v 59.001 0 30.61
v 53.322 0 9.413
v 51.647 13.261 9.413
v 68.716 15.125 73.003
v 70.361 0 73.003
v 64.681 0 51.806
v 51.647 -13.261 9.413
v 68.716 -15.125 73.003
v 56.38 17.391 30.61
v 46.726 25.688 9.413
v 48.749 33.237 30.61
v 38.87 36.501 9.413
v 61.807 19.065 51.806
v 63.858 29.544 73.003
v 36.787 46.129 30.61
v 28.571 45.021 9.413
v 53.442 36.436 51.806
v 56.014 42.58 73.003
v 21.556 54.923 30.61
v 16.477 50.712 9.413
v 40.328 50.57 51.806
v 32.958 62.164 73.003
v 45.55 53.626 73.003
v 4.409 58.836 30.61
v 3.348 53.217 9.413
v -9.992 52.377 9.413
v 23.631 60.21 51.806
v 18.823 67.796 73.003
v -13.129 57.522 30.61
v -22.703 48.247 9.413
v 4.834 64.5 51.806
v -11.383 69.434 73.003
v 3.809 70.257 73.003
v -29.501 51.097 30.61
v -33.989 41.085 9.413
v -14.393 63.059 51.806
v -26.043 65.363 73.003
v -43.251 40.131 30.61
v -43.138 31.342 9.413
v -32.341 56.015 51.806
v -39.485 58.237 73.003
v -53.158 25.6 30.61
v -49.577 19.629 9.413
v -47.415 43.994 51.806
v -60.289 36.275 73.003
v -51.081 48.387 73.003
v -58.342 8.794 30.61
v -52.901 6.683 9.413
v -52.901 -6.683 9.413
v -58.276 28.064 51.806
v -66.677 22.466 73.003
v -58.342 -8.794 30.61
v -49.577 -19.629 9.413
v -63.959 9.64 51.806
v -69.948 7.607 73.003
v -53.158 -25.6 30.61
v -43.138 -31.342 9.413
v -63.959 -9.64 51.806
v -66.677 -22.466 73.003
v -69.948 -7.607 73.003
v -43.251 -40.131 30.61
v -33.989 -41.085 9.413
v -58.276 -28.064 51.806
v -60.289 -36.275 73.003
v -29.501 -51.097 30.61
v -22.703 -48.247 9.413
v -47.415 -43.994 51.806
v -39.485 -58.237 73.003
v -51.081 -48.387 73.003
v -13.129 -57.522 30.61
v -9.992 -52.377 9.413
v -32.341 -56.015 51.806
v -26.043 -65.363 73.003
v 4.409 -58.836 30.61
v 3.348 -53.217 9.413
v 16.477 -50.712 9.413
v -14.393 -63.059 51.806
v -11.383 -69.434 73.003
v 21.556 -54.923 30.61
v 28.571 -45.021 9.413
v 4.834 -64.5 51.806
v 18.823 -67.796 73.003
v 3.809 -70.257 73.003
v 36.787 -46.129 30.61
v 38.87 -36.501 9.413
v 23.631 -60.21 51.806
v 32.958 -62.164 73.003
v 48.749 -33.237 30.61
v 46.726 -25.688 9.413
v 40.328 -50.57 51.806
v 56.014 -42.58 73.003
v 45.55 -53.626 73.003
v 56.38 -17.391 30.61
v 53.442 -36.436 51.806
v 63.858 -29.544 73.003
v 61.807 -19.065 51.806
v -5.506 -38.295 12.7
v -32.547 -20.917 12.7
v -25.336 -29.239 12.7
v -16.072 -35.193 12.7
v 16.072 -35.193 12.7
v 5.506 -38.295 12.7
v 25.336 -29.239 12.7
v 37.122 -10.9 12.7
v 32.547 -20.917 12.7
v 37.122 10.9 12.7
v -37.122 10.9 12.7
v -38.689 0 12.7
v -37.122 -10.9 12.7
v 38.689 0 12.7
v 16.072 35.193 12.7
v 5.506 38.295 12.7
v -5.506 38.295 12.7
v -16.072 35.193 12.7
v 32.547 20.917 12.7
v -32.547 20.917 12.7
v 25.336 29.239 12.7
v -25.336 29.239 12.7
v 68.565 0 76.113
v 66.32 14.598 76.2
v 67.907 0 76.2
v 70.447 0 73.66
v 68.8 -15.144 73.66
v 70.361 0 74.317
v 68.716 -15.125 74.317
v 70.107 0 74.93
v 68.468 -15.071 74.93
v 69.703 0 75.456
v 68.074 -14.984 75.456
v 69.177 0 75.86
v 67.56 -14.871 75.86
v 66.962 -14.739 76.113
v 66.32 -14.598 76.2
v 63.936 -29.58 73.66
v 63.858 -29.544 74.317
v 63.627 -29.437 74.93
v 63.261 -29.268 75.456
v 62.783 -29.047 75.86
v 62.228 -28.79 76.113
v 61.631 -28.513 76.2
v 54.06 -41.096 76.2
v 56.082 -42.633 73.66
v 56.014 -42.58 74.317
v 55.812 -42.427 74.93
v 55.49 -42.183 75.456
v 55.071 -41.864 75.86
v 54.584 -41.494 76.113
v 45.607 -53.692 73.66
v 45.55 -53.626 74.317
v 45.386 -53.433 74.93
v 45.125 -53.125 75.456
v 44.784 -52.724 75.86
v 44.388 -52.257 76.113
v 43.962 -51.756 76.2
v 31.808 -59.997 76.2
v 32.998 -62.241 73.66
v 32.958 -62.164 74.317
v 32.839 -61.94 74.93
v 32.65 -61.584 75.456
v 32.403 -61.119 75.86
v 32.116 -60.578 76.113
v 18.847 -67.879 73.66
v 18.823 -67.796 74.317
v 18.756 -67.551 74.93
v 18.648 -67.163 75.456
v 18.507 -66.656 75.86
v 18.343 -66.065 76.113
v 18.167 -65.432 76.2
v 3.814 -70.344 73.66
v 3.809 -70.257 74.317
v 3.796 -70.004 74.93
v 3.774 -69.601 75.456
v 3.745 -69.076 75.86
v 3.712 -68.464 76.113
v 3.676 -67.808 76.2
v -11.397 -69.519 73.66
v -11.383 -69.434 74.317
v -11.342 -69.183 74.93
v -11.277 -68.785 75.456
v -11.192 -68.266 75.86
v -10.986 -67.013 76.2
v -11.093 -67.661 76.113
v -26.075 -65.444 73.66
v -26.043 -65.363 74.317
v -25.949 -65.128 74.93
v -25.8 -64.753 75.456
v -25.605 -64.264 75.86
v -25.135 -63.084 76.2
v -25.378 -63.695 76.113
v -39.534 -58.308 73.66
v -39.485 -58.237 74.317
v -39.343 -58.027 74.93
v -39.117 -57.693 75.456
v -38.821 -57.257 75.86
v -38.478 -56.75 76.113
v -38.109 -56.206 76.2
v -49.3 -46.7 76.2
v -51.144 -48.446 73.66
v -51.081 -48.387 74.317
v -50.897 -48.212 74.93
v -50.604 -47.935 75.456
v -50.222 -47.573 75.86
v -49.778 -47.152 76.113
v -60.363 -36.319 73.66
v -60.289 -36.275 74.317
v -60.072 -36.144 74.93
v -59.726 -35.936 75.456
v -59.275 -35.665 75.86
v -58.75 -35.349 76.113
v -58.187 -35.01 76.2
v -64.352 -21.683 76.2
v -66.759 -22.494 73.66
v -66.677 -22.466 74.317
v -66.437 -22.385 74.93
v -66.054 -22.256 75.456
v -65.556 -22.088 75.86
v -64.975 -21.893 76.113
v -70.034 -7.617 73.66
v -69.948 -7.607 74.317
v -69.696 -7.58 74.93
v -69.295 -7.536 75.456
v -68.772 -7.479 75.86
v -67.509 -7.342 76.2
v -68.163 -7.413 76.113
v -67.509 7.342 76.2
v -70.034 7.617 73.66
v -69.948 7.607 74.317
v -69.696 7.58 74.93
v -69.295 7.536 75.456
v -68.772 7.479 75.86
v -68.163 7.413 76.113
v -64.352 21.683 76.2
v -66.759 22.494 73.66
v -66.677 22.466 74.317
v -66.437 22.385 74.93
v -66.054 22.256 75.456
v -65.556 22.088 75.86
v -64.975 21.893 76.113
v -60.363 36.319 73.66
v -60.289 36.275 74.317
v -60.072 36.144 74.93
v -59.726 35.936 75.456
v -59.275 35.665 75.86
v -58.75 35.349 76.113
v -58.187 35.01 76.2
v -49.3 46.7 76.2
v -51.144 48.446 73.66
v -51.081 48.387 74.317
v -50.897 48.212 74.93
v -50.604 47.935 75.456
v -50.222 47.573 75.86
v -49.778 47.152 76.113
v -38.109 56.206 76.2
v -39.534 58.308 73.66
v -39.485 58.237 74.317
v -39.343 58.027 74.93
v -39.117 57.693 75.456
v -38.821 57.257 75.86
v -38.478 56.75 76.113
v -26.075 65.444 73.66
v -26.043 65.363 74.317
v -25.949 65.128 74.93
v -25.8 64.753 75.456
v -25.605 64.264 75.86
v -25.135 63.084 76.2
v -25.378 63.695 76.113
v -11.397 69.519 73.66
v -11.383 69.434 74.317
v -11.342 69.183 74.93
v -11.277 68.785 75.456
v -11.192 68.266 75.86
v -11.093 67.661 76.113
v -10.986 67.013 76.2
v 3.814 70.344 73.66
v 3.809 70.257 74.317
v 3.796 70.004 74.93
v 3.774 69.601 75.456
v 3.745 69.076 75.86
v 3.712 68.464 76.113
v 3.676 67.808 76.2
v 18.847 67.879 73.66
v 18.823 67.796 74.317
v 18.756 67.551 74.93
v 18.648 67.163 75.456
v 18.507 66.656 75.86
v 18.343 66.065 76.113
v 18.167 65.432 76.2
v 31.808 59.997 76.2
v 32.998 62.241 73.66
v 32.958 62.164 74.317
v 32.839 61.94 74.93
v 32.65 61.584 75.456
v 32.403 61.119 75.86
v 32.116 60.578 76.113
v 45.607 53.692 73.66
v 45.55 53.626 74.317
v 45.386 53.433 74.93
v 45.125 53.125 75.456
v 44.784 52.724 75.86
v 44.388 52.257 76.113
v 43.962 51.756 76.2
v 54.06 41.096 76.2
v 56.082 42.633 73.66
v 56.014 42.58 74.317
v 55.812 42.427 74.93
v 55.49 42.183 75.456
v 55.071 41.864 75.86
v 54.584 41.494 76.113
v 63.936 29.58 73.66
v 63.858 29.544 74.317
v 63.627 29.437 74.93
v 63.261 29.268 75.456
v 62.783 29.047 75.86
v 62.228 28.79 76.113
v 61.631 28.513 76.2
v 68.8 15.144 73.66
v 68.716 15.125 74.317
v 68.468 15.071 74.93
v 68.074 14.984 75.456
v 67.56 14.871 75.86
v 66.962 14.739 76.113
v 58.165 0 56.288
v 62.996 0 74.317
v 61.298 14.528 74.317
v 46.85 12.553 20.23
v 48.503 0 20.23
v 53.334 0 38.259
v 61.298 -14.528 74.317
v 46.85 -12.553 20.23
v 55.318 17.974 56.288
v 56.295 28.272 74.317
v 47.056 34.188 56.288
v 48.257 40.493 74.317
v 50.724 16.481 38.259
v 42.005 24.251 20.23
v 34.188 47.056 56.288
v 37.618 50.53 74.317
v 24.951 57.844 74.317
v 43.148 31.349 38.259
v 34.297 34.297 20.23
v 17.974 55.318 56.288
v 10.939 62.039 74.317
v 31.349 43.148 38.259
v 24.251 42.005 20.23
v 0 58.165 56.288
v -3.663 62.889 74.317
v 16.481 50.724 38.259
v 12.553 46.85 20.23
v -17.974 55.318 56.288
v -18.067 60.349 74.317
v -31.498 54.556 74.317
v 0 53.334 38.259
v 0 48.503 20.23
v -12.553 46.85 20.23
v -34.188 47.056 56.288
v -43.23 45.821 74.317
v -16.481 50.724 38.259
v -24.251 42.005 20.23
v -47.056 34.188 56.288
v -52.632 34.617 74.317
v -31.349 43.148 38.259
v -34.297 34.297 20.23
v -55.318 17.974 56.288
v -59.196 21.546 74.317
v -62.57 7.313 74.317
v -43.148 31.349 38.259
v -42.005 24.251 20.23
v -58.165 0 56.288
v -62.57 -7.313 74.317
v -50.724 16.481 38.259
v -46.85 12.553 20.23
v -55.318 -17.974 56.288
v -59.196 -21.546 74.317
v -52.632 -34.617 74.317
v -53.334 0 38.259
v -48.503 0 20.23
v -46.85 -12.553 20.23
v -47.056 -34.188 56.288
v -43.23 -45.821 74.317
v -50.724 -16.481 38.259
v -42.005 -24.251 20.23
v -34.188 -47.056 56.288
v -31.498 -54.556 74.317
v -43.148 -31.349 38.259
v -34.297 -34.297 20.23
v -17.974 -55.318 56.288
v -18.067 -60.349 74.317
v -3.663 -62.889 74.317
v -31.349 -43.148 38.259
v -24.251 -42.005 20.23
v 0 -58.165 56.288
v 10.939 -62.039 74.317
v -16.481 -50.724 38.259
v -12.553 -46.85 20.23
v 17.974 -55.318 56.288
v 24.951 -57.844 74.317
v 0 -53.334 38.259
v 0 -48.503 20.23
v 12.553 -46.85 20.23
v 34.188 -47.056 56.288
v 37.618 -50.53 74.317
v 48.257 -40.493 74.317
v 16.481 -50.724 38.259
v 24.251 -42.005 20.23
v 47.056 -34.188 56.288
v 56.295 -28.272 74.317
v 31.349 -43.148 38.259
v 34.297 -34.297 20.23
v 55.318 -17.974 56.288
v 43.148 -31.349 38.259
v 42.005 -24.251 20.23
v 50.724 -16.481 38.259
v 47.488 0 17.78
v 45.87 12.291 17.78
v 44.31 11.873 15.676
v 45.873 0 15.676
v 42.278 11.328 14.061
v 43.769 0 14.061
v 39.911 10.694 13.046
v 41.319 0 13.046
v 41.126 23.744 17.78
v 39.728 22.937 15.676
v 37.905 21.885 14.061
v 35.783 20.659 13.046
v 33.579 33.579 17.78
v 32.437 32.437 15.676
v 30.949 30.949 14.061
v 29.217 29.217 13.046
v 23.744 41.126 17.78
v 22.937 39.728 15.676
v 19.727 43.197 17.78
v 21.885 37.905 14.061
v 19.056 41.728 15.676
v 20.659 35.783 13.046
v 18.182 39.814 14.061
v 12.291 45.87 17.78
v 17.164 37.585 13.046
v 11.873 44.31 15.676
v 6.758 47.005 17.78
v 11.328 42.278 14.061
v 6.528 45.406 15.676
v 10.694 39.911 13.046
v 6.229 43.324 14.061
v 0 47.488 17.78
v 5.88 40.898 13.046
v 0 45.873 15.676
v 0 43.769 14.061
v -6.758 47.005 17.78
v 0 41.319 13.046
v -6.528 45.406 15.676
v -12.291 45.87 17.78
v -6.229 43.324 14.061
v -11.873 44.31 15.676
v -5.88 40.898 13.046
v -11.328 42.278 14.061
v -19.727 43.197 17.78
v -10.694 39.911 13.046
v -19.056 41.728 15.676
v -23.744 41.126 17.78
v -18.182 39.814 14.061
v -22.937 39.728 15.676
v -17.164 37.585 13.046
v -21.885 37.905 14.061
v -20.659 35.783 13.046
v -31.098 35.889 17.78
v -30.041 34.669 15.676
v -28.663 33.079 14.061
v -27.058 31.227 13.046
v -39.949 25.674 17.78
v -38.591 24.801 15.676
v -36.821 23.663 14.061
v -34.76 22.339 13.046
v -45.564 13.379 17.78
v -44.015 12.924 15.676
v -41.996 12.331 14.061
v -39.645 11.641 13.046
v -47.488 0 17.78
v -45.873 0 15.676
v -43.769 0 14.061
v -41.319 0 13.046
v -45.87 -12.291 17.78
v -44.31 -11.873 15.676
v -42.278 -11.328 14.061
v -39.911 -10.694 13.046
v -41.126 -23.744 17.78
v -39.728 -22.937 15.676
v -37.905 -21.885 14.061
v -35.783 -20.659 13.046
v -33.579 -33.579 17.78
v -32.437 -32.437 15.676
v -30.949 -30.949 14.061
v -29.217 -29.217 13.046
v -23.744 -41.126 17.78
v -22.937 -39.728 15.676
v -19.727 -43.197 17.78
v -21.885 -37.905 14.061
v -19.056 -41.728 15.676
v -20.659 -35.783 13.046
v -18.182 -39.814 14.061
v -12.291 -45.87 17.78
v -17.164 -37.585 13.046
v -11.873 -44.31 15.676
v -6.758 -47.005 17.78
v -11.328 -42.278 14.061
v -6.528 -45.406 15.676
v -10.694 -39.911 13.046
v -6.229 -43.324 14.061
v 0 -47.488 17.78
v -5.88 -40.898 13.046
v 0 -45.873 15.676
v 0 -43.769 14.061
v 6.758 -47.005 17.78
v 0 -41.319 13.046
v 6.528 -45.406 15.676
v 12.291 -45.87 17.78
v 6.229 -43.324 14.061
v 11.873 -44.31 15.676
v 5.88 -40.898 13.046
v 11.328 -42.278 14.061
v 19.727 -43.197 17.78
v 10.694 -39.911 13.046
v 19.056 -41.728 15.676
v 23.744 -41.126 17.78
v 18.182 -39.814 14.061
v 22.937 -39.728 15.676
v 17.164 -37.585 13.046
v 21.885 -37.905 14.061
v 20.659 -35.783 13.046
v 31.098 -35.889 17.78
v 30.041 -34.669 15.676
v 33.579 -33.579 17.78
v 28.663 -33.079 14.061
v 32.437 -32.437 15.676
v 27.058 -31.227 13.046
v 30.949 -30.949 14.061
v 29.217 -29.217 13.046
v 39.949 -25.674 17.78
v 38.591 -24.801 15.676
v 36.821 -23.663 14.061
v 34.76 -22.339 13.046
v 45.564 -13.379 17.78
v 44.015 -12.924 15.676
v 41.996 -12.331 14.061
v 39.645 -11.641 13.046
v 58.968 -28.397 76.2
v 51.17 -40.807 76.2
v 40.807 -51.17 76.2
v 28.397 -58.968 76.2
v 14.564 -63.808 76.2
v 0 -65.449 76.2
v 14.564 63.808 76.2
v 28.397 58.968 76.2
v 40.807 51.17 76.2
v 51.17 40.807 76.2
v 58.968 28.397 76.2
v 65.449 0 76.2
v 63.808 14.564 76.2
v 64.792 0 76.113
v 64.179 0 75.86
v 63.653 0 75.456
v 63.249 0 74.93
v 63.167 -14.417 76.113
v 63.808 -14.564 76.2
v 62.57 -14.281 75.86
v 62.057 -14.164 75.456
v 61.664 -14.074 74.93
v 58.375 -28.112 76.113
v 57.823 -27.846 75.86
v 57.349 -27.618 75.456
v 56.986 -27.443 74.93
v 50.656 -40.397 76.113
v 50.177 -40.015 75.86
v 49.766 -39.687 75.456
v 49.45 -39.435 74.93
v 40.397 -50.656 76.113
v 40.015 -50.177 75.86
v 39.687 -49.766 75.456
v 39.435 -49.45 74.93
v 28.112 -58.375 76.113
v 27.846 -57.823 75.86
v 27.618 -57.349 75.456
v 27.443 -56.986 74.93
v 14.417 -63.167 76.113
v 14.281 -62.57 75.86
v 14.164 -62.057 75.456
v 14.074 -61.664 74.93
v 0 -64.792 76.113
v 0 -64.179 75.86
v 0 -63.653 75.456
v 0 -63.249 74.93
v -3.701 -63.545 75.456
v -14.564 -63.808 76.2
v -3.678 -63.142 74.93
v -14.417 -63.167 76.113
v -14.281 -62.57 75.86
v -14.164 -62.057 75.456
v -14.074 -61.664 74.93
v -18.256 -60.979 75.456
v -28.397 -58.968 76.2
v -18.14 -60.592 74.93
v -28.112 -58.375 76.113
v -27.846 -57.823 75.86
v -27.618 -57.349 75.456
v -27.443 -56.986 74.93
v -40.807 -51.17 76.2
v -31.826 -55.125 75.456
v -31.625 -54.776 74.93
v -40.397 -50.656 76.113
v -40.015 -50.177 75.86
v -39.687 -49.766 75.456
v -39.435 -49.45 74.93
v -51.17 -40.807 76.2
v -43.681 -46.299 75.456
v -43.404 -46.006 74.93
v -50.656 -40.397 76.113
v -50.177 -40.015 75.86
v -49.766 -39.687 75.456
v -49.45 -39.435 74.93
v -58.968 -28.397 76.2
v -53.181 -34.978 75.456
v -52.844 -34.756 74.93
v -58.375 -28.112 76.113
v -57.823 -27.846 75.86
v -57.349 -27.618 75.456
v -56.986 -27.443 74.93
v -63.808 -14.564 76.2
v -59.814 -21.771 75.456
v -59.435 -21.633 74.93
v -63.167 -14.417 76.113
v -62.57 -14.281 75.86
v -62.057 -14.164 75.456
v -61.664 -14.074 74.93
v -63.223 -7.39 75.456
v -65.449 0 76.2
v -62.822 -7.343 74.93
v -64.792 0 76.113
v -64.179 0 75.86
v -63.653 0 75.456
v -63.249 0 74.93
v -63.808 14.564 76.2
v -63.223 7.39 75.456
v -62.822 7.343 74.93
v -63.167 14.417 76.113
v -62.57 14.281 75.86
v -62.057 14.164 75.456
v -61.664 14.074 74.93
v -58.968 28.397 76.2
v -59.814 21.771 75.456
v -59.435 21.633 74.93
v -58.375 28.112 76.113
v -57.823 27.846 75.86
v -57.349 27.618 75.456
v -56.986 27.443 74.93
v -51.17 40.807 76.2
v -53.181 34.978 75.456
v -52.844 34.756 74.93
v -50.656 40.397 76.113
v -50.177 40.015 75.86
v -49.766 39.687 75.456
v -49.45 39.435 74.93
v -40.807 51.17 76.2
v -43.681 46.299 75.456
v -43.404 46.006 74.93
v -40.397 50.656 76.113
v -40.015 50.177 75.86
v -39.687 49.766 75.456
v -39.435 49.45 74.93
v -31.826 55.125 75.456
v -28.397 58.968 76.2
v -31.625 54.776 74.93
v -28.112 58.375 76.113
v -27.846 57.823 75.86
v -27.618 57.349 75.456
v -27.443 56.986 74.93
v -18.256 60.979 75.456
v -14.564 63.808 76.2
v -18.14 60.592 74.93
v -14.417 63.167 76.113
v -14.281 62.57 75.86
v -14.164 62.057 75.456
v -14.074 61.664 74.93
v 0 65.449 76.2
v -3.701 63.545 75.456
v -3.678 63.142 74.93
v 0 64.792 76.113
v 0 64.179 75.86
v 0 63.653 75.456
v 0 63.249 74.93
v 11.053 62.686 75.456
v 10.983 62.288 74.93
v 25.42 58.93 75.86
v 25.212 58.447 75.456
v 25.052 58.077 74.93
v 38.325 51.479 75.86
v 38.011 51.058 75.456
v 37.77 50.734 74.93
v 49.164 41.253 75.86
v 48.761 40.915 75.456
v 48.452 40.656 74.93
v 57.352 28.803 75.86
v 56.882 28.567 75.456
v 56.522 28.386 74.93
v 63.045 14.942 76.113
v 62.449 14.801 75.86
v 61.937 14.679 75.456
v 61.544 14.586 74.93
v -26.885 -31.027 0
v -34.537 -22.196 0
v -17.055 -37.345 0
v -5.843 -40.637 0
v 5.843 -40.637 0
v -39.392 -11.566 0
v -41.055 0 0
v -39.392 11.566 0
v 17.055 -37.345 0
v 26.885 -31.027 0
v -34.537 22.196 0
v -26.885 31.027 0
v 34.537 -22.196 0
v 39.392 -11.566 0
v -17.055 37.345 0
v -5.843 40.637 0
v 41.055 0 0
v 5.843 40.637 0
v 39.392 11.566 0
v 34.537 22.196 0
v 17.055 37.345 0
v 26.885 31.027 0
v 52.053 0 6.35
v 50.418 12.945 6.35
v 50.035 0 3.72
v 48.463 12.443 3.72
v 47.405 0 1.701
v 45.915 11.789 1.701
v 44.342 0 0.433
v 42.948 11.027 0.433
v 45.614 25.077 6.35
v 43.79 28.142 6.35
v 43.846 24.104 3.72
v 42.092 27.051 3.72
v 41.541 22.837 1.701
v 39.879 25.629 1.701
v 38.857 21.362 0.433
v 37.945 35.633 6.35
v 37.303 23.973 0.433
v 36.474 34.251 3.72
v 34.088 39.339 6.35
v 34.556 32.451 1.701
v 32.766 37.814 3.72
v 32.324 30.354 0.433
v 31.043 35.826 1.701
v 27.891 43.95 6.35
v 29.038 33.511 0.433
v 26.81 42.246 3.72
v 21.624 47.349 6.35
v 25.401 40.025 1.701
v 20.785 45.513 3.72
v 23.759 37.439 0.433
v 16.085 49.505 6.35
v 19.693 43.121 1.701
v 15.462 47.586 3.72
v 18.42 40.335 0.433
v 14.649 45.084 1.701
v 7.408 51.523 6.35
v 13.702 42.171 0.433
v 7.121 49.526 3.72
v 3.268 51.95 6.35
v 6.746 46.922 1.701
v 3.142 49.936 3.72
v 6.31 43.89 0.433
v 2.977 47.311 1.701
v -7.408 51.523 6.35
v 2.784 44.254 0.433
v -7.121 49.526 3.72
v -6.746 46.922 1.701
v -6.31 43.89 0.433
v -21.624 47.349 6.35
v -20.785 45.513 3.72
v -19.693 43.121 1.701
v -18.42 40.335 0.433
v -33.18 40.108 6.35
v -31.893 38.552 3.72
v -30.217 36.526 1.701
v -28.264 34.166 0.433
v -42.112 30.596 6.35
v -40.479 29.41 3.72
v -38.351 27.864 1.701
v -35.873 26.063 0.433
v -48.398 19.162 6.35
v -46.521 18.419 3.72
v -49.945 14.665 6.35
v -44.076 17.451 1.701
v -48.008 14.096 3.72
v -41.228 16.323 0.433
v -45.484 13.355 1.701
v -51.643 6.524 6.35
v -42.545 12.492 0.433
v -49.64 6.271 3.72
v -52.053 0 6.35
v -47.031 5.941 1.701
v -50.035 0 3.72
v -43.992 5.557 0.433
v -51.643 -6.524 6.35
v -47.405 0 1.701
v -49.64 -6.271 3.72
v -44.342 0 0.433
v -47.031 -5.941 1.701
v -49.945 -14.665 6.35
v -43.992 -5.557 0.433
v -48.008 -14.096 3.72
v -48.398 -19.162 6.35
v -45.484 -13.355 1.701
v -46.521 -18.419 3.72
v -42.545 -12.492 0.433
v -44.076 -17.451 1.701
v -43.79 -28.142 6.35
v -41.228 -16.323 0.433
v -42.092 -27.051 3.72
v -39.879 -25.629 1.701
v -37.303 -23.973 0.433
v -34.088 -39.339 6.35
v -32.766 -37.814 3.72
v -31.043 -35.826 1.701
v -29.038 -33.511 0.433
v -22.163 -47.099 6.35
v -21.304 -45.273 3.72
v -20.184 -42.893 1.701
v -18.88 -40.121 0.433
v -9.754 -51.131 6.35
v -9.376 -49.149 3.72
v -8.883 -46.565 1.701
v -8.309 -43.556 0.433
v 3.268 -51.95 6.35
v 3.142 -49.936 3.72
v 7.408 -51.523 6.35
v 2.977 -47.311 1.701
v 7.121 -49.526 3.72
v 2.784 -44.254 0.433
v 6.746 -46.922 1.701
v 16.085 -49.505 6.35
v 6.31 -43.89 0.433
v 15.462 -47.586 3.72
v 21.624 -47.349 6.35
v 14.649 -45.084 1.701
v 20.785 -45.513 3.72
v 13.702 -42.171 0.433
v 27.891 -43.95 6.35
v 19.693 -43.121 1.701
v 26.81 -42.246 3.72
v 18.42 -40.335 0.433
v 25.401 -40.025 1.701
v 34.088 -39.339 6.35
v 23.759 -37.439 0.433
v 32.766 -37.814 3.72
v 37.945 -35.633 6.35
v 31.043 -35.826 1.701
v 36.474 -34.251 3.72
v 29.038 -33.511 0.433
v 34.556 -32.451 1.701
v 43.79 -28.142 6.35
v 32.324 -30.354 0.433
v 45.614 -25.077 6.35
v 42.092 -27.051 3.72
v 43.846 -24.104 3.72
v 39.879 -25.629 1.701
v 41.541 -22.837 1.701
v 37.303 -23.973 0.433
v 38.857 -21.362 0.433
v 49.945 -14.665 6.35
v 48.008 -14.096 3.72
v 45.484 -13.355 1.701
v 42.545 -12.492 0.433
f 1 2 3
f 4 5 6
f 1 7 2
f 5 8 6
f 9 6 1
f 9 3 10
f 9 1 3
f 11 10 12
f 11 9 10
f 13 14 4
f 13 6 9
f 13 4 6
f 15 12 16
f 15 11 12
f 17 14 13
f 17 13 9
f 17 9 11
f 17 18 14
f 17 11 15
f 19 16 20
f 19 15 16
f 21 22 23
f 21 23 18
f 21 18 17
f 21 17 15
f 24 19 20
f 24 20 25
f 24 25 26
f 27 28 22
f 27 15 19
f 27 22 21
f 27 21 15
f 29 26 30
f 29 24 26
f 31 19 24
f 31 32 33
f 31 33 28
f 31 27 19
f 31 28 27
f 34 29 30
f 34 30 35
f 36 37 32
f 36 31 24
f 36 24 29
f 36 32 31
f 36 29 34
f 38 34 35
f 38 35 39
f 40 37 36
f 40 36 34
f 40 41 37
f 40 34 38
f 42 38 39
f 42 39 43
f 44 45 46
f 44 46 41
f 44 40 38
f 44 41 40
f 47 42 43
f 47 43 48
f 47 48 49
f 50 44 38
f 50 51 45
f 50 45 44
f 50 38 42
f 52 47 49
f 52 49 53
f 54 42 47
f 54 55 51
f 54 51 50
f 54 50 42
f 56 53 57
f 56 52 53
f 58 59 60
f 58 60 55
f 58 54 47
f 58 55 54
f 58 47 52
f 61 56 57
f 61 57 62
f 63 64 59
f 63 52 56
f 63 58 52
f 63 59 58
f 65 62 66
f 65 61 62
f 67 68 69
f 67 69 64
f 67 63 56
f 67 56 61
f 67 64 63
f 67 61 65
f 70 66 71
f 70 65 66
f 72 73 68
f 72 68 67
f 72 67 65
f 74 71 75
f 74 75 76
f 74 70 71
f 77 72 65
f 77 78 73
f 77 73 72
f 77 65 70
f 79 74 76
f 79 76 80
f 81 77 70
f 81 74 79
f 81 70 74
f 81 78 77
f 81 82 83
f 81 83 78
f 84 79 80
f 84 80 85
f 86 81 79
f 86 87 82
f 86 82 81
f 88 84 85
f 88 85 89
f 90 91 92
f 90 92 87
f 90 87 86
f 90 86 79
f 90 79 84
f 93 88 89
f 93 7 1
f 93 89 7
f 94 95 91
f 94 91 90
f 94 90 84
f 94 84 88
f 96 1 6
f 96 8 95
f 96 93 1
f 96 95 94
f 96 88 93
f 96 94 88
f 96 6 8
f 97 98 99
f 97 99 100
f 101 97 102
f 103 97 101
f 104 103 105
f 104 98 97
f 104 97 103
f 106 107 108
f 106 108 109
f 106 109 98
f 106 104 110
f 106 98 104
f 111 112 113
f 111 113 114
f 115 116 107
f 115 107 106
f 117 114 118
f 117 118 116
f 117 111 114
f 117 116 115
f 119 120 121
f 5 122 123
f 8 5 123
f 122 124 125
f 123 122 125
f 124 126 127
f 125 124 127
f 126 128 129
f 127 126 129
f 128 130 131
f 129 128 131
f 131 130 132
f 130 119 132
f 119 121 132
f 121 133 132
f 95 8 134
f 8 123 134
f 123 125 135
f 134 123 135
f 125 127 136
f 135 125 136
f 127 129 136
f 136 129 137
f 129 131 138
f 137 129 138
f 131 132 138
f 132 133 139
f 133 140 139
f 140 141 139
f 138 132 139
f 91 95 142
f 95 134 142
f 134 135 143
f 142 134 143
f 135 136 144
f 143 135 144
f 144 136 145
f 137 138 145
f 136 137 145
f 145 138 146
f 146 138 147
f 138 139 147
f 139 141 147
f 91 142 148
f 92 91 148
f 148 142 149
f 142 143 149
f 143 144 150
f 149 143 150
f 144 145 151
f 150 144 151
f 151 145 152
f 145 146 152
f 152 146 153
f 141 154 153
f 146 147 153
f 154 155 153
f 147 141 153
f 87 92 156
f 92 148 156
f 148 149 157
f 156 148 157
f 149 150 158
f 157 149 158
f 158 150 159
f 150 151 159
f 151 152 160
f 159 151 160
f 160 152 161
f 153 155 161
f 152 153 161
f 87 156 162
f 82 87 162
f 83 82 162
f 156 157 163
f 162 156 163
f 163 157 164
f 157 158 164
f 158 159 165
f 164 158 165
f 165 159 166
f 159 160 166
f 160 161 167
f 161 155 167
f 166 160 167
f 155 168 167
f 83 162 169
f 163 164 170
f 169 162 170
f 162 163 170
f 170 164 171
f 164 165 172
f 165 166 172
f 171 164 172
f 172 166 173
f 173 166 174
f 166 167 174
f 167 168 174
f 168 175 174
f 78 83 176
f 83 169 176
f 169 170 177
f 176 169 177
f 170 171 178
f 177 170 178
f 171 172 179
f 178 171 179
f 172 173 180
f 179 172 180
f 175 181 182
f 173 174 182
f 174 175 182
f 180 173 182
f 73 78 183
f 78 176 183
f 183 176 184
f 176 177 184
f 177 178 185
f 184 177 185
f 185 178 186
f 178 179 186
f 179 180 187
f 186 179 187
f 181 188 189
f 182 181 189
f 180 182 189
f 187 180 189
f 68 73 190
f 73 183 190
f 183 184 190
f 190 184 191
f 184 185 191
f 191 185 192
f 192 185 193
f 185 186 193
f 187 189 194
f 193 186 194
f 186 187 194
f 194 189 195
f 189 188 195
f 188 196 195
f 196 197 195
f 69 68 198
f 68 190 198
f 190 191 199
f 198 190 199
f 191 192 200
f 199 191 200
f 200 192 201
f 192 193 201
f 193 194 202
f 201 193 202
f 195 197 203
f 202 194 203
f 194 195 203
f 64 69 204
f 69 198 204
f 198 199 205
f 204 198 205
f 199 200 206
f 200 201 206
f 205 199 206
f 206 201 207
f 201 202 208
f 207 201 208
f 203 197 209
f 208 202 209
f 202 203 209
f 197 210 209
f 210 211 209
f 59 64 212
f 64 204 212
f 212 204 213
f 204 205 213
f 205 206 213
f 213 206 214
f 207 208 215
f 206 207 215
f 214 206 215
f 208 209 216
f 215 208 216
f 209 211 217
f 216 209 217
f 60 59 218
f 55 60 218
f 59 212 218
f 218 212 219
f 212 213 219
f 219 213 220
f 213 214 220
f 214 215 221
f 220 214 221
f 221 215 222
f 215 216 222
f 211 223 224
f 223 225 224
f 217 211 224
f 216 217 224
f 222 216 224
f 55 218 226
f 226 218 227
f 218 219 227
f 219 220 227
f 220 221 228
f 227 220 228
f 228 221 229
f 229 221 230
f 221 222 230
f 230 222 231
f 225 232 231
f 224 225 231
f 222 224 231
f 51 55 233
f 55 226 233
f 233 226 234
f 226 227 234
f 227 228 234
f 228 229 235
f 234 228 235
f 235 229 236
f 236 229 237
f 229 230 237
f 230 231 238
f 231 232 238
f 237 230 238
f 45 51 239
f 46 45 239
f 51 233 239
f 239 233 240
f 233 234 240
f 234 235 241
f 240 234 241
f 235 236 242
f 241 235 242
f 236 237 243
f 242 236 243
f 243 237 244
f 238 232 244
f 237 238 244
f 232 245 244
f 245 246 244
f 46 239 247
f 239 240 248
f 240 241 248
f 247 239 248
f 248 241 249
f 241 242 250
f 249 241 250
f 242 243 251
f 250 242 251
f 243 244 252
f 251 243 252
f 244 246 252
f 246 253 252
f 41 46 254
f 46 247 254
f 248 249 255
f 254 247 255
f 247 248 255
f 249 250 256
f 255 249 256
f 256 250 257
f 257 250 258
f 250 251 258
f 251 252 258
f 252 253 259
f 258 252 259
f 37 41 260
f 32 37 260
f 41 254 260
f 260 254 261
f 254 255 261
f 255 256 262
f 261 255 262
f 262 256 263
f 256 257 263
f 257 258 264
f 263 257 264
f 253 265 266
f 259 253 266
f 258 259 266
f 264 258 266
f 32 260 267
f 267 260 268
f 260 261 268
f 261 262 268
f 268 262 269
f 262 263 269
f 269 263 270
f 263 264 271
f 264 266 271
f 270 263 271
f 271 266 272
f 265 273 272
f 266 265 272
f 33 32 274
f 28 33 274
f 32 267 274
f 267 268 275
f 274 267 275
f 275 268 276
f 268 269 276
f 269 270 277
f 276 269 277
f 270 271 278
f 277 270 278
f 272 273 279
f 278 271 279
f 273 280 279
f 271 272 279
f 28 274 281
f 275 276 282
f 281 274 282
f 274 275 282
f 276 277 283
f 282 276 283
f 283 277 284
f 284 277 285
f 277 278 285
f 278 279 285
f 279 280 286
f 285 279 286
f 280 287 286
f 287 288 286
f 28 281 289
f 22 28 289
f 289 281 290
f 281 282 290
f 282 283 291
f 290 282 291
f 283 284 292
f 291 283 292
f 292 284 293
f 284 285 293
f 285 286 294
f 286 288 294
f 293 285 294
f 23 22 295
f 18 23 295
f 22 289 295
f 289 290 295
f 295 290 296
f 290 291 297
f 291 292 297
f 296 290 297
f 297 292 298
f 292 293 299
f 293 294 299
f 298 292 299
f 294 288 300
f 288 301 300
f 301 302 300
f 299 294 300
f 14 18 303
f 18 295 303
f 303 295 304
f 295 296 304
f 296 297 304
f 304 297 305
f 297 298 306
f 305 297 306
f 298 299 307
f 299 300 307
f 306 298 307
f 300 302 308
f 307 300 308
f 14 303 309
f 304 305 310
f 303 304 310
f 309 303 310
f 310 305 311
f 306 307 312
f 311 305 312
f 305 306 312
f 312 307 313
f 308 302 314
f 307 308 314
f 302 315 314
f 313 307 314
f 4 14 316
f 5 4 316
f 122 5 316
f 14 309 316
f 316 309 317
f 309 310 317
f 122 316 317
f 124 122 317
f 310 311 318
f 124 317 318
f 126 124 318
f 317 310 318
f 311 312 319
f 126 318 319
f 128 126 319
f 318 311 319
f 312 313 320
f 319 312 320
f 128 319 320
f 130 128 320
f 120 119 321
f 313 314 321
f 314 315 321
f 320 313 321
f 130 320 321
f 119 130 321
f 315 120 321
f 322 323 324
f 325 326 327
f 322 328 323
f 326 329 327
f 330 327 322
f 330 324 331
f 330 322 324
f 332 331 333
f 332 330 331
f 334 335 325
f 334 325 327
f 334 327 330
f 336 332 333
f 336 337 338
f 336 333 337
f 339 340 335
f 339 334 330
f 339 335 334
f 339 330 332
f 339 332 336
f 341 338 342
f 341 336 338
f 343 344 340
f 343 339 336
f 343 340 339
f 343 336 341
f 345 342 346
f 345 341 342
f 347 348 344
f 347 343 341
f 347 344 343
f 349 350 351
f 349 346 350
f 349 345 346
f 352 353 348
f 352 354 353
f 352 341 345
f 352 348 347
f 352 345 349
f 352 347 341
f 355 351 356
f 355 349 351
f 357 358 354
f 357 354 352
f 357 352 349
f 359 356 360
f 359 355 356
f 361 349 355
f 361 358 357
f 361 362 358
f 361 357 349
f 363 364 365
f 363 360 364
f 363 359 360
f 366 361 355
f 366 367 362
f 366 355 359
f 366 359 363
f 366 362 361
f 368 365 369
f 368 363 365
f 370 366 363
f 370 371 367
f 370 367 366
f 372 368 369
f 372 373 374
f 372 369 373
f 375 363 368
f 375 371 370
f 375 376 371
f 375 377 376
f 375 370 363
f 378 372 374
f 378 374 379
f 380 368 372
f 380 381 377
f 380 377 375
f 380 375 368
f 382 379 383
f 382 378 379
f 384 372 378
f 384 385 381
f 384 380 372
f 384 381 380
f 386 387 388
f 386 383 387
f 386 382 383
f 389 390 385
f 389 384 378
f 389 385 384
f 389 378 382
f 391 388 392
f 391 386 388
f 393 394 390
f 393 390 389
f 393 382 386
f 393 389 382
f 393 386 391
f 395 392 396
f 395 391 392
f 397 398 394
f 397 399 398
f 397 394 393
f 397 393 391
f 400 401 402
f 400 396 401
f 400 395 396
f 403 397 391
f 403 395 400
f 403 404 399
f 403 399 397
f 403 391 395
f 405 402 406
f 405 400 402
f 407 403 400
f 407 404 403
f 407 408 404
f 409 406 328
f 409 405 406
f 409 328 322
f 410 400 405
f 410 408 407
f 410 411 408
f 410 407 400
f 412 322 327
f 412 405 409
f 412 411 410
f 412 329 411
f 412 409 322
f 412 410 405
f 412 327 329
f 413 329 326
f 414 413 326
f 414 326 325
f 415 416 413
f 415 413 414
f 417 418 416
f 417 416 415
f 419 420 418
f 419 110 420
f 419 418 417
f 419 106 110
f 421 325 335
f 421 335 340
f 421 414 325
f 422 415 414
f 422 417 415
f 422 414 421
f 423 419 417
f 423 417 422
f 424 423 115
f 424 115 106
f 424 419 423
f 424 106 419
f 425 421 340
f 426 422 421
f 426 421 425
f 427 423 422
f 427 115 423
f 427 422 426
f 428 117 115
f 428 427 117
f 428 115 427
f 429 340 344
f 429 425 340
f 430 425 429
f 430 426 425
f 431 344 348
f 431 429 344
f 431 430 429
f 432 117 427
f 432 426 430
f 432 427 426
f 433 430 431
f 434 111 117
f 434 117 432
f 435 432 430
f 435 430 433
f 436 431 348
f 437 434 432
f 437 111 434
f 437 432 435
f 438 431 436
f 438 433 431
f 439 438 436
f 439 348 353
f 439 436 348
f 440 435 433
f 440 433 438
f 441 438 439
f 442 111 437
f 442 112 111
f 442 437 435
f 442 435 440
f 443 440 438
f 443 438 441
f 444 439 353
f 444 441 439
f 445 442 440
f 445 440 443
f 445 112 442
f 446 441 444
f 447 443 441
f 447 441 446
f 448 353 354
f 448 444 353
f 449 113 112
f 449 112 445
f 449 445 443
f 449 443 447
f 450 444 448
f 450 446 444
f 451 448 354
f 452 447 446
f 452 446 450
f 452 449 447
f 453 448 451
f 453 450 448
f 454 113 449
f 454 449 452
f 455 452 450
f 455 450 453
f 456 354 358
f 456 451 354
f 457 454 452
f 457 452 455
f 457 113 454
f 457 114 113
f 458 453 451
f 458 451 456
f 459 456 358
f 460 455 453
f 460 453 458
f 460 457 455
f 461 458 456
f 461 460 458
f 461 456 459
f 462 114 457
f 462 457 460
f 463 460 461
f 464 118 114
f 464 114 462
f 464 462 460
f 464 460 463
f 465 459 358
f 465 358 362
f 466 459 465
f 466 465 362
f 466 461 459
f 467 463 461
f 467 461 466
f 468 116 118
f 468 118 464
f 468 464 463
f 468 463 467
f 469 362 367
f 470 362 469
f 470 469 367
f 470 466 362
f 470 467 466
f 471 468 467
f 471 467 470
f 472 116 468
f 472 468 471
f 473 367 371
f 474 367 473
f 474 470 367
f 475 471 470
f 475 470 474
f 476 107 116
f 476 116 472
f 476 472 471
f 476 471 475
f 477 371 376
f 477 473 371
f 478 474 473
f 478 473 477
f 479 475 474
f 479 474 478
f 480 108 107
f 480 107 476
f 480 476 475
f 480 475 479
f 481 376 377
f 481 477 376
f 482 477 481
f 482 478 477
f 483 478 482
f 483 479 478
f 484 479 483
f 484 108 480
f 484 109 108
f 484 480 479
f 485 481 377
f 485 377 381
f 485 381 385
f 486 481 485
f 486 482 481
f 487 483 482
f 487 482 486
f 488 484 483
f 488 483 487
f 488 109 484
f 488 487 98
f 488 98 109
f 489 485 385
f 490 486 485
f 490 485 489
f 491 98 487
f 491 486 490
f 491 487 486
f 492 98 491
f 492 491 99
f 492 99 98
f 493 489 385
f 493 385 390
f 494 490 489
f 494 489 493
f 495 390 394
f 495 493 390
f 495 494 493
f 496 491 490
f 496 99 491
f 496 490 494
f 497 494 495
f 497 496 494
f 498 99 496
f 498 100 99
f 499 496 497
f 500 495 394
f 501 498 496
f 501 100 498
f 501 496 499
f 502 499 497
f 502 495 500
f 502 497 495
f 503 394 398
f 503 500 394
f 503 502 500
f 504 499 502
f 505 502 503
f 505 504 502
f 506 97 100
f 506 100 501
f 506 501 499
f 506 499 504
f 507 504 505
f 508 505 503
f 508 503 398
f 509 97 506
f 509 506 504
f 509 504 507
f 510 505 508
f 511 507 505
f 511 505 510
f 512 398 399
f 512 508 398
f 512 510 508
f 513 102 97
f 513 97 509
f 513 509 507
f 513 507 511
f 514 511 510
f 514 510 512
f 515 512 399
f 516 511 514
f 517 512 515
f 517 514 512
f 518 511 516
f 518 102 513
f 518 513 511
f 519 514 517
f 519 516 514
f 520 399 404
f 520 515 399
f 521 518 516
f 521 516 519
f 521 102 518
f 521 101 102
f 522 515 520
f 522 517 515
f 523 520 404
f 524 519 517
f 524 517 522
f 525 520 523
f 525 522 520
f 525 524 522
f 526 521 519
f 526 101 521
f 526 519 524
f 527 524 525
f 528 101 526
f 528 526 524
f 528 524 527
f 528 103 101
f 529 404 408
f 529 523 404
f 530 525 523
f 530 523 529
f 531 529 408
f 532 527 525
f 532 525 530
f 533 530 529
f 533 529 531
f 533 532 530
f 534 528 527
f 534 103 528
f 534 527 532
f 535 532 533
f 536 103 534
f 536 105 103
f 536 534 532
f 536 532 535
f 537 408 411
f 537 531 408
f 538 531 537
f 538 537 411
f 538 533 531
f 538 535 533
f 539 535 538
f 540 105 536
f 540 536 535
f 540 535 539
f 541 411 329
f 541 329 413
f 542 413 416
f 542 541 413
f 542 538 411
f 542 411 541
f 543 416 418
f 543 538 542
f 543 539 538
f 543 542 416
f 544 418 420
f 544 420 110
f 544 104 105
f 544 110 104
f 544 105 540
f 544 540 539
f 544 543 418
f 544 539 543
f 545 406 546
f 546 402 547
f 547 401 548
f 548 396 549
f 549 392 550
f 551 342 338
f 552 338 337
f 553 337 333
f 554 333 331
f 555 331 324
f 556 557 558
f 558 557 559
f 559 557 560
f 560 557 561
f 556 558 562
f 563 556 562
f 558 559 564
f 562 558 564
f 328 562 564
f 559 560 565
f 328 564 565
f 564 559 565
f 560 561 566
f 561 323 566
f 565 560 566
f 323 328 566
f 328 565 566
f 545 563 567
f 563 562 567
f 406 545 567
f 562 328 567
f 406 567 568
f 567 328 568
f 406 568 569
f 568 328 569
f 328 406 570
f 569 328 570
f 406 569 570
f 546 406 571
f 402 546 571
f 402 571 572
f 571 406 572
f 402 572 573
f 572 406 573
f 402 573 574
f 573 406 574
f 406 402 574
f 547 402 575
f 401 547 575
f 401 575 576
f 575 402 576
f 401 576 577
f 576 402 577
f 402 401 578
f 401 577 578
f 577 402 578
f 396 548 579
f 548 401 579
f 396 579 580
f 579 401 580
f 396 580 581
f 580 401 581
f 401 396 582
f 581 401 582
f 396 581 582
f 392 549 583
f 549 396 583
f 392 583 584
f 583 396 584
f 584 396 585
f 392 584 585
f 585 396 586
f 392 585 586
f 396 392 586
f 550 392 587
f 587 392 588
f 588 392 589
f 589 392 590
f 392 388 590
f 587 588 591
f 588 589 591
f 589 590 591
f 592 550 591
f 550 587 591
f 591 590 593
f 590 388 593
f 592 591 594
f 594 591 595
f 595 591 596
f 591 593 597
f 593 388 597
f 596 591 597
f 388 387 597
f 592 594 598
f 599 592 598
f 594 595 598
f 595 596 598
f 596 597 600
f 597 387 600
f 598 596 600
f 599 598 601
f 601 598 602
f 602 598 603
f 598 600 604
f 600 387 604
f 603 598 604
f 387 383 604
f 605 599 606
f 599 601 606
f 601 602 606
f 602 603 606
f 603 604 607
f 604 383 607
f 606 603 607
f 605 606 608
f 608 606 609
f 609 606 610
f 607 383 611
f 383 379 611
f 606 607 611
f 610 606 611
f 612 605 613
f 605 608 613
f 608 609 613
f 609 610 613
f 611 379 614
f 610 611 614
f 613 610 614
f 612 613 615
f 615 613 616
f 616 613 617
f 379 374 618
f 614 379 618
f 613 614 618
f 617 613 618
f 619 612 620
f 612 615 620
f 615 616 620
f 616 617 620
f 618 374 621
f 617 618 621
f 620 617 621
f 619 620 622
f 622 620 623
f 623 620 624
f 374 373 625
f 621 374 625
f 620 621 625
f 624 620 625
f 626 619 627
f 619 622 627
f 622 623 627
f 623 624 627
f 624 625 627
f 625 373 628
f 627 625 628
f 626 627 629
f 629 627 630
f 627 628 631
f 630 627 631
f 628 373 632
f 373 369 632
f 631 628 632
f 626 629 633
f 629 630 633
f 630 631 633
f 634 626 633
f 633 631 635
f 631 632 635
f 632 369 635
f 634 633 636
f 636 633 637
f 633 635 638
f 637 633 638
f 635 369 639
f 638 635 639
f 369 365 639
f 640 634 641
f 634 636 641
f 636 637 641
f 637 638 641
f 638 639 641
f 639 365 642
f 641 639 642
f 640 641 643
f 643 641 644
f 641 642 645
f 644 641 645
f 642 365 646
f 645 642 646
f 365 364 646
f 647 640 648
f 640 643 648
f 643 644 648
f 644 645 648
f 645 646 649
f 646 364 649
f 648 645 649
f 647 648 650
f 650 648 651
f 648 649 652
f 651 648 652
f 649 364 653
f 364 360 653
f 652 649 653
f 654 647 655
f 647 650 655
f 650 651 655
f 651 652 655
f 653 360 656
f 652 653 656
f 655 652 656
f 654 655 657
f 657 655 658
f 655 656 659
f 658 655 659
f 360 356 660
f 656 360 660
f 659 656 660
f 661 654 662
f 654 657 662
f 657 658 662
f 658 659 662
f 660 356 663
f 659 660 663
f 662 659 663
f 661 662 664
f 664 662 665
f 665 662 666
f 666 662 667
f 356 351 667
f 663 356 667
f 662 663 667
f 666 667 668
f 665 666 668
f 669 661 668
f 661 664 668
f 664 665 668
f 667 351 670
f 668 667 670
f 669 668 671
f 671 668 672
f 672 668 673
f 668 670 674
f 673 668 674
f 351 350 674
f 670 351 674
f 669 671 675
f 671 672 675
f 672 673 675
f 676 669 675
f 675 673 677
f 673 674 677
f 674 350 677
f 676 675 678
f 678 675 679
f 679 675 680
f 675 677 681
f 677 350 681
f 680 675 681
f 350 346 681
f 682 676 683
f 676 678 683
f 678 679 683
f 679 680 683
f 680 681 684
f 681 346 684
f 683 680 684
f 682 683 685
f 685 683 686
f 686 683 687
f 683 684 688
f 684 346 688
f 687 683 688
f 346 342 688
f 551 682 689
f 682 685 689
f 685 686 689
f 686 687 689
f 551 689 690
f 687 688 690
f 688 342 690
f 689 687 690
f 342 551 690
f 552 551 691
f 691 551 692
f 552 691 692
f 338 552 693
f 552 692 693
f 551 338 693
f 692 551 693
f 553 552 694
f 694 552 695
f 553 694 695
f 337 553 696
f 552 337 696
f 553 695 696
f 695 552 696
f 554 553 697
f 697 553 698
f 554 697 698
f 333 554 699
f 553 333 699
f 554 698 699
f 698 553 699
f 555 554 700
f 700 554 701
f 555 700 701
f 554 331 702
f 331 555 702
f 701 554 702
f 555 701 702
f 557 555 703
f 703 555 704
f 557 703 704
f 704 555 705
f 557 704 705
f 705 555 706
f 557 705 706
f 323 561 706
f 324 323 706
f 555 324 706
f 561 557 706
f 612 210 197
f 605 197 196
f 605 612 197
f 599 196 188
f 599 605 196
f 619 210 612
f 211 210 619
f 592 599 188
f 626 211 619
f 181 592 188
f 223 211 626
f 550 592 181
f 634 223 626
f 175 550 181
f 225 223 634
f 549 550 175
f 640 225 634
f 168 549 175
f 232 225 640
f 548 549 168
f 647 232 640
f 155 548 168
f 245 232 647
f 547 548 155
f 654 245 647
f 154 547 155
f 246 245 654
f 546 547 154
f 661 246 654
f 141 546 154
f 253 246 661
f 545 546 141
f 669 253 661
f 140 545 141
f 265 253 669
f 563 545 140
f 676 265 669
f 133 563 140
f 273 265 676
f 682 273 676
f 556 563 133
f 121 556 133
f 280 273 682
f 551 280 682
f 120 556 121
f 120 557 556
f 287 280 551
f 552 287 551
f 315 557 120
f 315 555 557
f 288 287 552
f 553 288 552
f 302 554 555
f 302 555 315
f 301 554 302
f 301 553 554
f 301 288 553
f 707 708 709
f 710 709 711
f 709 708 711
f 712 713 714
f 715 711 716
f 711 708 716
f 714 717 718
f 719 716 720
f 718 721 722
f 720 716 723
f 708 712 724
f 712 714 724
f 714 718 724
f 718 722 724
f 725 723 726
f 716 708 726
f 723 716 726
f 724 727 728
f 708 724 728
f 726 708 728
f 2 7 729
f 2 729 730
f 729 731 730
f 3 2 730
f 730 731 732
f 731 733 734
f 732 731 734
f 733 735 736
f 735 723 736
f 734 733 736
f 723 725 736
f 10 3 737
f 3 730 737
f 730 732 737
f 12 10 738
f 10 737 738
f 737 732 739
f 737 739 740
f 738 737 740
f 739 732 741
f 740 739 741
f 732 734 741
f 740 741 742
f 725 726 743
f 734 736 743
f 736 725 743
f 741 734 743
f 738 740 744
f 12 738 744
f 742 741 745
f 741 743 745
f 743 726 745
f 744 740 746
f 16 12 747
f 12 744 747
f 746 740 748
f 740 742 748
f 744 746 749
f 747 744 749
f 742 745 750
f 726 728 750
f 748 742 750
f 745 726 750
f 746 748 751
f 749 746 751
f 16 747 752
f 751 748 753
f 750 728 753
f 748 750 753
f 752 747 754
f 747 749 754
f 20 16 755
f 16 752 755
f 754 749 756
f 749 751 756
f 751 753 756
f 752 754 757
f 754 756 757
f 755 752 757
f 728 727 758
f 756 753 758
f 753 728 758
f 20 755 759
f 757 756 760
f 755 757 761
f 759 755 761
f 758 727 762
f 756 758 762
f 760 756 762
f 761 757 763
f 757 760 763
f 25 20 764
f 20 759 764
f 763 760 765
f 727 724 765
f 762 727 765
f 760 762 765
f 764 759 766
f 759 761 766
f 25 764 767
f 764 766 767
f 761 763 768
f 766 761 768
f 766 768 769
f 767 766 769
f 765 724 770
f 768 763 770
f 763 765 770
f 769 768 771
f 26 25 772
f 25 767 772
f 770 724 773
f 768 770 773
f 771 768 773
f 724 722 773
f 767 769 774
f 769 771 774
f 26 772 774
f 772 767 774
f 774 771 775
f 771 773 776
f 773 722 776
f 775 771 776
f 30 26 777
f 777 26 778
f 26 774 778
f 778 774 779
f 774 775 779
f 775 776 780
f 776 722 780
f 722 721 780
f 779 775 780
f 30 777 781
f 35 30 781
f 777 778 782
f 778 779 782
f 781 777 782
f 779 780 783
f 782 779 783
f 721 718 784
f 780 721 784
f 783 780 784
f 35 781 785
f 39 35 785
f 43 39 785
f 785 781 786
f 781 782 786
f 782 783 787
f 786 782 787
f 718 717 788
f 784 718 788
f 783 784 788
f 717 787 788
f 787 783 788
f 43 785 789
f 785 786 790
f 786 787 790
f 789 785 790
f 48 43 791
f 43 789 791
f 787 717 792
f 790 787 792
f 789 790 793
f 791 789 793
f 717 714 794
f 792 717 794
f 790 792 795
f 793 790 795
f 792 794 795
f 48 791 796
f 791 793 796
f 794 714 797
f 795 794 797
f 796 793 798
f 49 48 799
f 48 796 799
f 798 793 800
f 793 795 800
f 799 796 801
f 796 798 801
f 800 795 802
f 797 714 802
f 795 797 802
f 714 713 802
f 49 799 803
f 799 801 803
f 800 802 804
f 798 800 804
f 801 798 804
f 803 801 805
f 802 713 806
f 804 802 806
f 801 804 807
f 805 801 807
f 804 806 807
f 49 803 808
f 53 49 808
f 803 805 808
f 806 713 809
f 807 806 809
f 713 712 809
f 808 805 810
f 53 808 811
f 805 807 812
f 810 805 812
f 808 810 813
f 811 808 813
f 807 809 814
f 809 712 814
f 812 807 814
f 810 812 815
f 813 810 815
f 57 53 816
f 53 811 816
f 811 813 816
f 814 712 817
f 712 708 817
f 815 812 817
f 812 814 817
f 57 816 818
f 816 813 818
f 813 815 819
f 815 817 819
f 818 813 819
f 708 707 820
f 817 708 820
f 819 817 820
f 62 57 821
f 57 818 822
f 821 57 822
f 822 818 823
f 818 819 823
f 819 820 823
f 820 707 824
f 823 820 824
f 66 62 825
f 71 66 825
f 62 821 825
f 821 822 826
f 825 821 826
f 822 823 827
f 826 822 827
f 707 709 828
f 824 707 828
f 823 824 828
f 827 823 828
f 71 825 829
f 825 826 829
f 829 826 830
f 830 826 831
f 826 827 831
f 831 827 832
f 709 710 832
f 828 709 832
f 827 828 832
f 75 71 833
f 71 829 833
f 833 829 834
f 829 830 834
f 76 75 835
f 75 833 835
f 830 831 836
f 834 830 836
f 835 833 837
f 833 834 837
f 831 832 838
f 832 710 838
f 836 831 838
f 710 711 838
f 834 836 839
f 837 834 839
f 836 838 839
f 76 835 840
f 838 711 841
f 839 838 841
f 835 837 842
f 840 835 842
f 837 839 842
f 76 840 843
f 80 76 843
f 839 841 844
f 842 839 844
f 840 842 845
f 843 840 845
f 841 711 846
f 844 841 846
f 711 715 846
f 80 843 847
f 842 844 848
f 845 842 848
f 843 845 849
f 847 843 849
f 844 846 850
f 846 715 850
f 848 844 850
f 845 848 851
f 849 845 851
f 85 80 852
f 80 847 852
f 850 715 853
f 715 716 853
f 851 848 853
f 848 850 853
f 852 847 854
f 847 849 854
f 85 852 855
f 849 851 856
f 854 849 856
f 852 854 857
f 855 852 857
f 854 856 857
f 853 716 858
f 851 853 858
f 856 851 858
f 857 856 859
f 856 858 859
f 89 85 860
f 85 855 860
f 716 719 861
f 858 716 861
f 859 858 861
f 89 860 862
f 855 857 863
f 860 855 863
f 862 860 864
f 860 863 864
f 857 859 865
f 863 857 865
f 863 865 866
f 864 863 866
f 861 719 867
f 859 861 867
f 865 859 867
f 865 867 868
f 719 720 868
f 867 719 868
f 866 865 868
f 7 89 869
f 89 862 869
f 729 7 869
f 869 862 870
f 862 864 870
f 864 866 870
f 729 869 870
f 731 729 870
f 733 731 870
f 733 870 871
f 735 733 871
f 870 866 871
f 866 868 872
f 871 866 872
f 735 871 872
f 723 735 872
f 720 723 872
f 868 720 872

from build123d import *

# Parameters (mm, degrees)
F0_R     = 50.7996215071
F1_DEPTH = 76.2
F1_TAPER = -15
F2_R     = 63.5
F3_DEPTH = 63.5
F3_TAPER = 15
F4_R     = 2.54
F5_R     = 12.7
F6_R     = 10.16


with BuildPart() as f1:
    # F0 (on Top) → F1 (new body)
    with BuildSketch(Plane.XY):
        Circle(F0_R)
    extrude(amount=F1_DEPTH, taper=F1_TAPER)

    # F2 (on face) → F3 (cut)
    with BuildSketch(Plane.XY.offset(76.2)):
        Circle(F2_R)
    extrude(amount=-F3_DEPTH, taper=F3_TAPER, mode=Mode.SUBTRACT)

    # F4
    f4_edges = [f1.edges().sort_by_distance(p)[0] for p in [
        (-71.21735, 0, 76.2),
        (-63.5, 0, 76.2),
    ]]
    fillet(f4_edges, radius=F4_R)

    # F5
    f5_edges = [f1.edges().sort_by_distance(p)[0] for p in [
        (-50.799622, 0, 0),
    ]]
    fillet(f5_edges, radius=F5_R)

    # F6
    f6_edges = [f1.edges().sort_by_distance(p)[0] for p in [
        (-46.485226, 0, 12.7),
    ]]
    fillet(f6_edges, radius=F6_R)


solid = f1.part
